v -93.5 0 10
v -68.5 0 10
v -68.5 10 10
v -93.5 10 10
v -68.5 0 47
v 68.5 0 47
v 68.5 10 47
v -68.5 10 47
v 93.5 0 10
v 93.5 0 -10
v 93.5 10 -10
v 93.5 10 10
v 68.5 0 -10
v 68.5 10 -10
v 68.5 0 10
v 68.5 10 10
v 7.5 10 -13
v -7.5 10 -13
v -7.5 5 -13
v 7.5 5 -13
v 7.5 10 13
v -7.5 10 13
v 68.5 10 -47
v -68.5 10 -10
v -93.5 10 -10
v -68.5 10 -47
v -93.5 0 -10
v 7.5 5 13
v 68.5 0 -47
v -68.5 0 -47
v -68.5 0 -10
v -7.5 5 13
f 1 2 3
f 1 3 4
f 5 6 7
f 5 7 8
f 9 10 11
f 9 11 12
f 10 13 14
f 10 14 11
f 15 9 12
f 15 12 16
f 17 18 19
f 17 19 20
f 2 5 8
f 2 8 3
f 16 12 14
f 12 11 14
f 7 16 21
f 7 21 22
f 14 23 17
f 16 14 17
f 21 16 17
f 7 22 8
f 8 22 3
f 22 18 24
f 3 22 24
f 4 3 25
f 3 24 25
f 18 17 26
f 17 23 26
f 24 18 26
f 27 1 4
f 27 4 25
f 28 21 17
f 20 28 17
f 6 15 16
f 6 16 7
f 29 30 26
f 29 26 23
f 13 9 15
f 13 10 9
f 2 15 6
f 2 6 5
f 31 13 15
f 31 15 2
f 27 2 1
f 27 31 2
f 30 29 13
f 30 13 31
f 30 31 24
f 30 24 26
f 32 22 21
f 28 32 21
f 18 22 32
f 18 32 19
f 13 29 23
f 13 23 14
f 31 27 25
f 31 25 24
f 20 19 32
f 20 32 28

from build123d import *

# Parameters (mm, degrees)
SALIENTE_EXTRUIR1_DEPTH = 10
CROQUIS3_W              = 15
CROQUIS3_H              = 26
CORTAR_EXTRUIR3_DEPTH   = 5


with BuildPart() as part:
    # Croquis1 → Saliente-Extruir1 (new body)
    with BuildSketch(Plane(origin=(0, 0, 0), x_dir=(1, 0, 0), z_dir=(0, 1, 0))):
        Polygon((93.5, -10), (68.5, -10), (68.5, -47), (-68.5, -47), (-68.5, -10), (-93.5, -10), (-93.5, 10), (-68.5, 10), (-68.5, 47), (68.5, 47), (68.5, 10), (93.5, 10), align=None)
    extrude(amount=SALIENTE_EXTRUIR1_DEPTH)

    # Croquis3 → Cortar-Extruir3 (cut)
    with BuildSketch(Plane(origin=(0, 10, 0), x_dir=(1, 0, 0), z_dir=(0, 1, 0))):
        Rectangle(CROQUIS3_W, CROQUIS3_H)
    extrude(amount=-CORTAR_EXTRUIR3_DEPTH, mode=Mode.SUBTRACT)


solid = part.part
